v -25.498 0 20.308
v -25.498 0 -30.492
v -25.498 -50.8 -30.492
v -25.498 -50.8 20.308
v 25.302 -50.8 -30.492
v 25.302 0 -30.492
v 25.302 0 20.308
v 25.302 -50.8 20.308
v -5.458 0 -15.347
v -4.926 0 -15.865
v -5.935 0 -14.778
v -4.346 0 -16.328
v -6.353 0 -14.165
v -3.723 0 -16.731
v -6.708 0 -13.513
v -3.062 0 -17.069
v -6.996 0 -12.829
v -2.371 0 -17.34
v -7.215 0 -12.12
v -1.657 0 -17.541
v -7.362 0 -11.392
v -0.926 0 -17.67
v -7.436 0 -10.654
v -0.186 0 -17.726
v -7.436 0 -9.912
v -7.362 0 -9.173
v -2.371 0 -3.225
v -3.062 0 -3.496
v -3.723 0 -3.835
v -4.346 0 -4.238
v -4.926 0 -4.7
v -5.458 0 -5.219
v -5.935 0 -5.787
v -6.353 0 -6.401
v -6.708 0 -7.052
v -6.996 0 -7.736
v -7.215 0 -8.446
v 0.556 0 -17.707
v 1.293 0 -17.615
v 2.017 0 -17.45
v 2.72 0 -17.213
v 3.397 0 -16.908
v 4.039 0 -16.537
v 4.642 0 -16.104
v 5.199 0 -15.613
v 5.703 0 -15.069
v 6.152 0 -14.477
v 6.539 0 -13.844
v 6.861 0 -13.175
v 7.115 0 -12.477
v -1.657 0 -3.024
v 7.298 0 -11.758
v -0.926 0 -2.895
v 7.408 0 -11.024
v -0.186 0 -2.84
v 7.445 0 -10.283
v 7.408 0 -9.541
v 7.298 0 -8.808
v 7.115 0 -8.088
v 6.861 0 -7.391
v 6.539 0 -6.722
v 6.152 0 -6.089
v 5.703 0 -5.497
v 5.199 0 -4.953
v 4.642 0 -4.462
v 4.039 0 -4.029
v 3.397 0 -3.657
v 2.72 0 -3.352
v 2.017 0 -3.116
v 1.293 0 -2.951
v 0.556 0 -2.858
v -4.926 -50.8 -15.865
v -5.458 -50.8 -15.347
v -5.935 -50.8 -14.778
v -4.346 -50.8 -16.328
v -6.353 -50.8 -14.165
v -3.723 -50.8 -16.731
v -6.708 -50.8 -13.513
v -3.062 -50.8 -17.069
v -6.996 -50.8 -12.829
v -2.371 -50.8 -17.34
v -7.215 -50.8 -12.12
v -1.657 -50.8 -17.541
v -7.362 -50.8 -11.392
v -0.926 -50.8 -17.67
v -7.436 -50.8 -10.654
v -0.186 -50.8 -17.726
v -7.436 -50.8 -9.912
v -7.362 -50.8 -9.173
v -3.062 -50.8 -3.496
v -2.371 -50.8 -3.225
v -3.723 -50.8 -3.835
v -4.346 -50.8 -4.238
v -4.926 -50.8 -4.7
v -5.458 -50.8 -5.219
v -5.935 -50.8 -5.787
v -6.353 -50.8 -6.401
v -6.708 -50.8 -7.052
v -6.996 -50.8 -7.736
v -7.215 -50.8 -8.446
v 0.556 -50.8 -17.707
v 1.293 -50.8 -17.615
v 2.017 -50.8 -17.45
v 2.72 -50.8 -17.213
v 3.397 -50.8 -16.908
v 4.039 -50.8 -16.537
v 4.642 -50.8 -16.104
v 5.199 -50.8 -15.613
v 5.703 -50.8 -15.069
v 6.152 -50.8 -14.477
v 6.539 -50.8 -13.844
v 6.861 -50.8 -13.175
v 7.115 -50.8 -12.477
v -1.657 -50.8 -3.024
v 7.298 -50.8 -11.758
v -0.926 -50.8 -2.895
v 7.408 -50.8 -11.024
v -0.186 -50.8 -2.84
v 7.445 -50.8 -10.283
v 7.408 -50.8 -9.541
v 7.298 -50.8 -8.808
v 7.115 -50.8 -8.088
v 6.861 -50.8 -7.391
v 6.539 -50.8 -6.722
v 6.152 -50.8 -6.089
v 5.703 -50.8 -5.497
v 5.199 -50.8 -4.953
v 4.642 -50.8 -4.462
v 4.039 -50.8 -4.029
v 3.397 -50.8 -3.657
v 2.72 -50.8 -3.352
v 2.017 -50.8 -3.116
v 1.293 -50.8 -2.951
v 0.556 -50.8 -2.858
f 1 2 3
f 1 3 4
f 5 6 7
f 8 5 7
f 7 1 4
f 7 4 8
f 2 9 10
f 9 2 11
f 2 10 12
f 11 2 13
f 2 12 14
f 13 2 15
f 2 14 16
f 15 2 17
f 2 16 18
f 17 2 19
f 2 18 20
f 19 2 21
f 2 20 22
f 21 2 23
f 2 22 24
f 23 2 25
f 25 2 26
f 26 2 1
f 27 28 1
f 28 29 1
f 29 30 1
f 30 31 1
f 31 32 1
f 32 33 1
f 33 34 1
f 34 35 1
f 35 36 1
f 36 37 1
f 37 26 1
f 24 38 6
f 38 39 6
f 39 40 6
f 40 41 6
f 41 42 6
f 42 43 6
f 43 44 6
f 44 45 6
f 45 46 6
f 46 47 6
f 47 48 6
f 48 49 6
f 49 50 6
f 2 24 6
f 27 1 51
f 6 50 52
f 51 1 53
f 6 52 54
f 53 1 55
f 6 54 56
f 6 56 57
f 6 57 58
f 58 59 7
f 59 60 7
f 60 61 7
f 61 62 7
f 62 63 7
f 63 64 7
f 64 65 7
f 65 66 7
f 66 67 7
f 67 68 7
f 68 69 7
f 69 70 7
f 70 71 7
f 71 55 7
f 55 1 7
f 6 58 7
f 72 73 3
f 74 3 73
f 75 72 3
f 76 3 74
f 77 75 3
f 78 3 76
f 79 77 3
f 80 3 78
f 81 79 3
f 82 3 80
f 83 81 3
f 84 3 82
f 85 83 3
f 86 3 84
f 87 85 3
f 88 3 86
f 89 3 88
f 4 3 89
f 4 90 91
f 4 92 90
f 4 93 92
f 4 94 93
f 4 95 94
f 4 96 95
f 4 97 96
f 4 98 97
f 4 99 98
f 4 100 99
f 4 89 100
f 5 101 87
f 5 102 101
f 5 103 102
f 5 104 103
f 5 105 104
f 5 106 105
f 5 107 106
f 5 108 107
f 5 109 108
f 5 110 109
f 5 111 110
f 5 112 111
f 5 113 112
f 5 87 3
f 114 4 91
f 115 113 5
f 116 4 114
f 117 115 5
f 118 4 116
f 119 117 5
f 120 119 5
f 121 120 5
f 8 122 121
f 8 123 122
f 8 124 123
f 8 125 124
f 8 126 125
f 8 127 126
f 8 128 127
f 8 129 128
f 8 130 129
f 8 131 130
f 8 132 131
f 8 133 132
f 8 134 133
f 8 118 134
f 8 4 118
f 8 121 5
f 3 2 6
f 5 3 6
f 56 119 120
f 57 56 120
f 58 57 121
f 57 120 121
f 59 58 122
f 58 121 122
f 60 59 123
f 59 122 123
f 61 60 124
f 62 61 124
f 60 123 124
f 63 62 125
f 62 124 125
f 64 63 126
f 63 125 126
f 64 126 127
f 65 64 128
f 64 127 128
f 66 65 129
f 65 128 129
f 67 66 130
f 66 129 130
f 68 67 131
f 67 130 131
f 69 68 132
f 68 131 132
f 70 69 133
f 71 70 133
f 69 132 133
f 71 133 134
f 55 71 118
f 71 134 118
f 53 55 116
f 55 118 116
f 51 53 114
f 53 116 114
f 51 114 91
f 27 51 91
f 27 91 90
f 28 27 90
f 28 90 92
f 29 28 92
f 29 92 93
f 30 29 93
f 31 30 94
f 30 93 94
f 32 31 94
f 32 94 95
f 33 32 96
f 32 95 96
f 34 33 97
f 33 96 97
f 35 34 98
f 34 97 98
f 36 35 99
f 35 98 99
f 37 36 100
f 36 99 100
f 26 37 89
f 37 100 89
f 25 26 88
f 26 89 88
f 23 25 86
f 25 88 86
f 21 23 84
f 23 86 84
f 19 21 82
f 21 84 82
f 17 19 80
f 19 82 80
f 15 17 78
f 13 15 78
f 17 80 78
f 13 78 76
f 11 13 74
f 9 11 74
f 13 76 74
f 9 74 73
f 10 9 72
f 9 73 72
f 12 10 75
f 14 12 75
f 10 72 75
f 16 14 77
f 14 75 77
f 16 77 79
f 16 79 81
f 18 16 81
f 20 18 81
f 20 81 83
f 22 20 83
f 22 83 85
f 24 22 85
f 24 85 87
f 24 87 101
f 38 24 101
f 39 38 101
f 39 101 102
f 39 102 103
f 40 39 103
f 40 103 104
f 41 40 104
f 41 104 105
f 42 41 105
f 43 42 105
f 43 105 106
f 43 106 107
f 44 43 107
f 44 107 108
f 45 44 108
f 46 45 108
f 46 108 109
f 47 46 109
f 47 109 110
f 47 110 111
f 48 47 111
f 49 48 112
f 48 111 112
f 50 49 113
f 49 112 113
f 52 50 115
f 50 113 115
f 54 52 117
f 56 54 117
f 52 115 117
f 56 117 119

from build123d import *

# Parameters (mm, degrees)
F0_W     = 50.8
F0_H     = 50.8
F1_DEPTH = 50.8
F2_R     = 7.4453677319
F3_DEPTH = 50.8
F5_DEPTH = 4.7625
F6_R     = 1.5875
F7_DEPTH = 25.4


with BuildPart() as f1:
    # F0 (on Front) → F1 (new body)
    with BuildSketch(Plane.XZ):
        with Locations((-0.097932294, -5.0924364477)):
            Rectangle(F0_W, F0_H)
    extrude(amount=F1_DEPTH)

    # F2 (on face) → F3 (cut)
    with BuildSketch(Plane.XZ.offset(50.8)):
        with Locations((0, -10.2828023955)):
            Circle(F2_R)
    extrude(amount=-F3_DEPTH, mode=Mode.SUBTRACT)


with BuildPart() as f5:
    # F4 (on Top) → F5 (new body)
    with BuildSketch(Plane.XY):
        Polygon((-51.9754371398, 50.3634488253), (-47.8477183507, 52.7390211454), (-47.8411649339, 57.5015166365), (-51.9623303063, 59.8884398075), (-56.0900490953, 57.5128674873), (-56.0966025121, 52.7503719962), align=None)
    extrude(amount=F5_DEPTH)

    # F5_face (on face) + F6 (on face) → F7 (cut)
    with BuildSketch(Plane(origin=(-51.968883723, 55.1259443164, 4.7625), x_dir=(1, 0, 0), z_dir=(0, 0, 1))):
        Polygon((-0.0065534168, -4.7624954911), (4.1211653723, -2.3869231709), (4.1277187891, 2.3755723202), (0.0065534168, 4.7624954911), (-4.1211653723, 2.3869231709), (-4.1277187891, -2.3755723202), align=None)
    with BuildSketch(Plane.XY):
        with Locations((-51.968883723, 55.1259443164)):
            Circle(F6_R)
    extrude(amount=-F7_DEPTH, mode=Mode.SUBTRACT)


solid = f1.part
